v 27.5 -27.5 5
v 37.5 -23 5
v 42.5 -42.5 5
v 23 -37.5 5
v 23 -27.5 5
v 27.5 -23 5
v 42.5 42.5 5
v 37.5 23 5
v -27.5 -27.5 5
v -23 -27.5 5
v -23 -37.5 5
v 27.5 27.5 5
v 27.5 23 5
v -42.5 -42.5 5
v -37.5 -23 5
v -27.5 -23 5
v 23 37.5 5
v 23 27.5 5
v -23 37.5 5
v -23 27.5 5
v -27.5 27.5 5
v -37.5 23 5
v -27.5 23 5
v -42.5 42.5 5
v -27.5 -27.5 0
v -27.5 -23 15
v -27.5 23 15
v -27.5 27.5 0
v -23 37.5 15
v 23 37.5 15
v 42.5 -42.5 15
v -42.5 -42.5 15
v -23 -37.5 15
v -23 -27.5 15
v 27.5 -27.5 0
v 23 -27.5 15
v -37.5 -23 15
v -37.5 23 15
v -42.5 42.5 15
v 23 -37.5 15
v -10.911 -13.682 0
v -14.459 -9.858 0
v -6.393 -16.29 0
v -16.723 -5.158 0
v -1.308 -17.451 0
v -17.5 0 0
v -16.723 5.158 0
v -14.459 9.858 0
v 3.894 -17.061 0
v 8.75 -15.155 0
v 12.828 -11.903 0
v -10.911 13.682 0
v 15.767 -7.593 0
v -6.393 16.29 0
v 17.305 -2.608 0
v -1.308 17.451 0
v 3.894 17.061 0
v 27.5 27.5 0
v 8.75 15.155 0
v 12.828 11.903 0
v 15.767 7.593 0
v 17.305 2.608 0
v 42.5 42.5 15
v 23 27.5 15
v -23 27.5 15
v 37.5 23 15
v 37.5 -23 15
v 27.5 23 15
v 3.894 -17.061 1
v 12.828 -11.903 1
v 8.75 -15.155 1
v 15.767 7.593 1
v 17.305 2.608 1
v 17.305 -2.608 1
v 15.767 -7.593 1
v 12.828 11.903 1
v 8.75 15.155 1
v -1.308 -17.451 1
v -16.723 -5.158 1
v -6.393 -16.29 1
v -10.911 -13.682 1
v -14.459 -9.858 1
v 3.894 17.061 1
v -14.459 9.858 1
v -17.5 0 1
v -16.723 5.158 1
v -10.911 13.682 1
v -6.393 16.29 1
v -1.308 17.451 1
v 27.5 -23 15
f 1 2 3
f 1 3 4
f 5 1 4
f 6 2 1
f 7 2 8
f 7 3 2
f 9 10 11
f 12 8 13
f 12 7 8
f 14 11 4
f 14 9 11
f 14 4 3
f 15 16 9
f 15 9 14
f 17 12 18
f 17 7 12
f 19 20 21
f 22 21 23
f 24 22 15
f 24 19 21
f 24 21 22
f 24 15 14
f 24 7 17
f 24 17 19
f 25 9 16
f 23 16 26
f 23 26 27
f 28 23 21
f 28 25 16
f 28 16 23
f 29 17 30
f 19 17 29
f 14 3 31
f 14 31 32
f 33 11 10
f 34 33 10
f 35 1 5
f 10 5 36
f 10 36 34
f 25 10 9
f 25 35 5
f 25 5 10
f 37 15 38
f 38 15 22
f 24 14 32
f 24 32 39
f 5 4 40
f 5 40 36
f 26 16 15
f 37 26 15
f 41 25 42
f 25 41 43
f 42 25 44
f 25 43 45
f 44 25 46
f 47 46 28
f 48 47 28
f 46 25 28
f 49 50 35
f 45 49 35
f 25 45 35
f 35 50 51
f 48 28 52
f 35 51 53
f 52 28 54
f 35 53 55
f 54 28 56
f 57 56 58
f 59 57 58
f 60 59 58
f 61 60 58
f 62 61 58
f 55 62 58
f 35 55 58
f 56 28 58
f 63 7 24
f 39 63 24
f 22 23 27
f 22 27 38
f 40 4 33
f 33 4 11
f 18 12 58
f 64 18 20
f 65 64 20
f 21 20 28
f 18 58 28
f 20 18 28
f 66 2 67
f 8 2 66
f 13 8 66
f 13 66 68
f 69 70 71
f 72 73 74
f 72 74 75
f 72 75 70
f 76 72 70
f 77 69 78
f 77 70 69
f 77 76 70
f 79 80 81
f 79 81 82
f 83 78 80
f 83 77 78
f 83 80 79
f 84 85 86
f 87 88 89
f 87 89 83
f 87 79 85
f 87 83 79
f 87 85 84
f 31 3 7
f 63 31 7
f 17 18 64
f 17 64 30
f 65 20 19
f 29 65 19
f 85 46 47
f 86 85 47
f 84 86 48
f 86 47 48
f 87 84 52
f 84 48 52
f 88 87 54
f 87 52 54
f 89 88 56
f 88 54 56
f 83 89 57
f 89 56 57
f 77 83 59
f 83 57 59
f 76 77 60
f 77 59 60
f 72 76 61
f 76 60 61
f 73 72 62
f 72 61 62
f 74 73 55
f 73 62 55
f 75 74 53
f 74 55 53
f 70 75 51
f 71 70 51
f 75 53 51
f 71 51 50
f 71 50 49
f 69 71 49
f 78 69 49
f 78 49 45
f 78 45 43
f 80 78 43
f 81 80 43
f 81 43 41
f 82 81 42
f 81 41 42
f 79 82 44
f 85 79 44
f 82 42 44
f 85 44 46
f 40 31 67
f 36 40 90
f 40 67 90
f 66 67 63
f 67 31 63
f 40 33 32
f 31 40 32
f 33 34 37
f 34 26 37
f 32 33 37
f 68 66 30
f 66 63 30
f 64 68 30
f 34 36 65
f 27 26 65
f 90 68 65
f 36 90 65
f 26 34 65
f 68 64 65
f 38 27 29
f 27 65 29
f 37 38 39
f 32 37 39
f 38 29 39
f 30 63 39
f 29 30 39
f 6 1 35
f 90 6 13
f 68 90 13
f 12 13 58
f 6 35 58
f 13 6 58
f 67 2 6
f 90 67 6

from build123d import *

# Parameters (mm, degrees)
SKETCH_1_W          = 75
SKETCH_1_H          = 75
EXTRUDE_1_DEPTH     = 15
SKETCH_6_R          = 17.5
CUT_EXTRUDE_7_DEPTH = 1
SKETCH_7_W          = 75
SKETCH_7_H          = 75
SKETCH_7_W_2        = 55
SKETCH_7_H_2        = 55
CUT_EXTRUDE_8_DEPTH = 5
SKETCH_8_W          = 10
SKETCH_8_H          = 46
SKETCH_8_W_2        = 46
SKETCH_8_H_2        = 10
CUT_EXTRUDE_9_DEPTH = 54.967582862
SKETCH_9_W          = 85
SKETCH_9_H          = 85
SKETCH_9_W_2        = 75
SKETCH_9_H_2        = 75
EXTRUDE_2_DEPTH     = 10


with BuildPart() as part:
    # ｽｹｯﾁ1 → ﾎﾞｽ - 押し出し1 (new body)
    with BuildSketch(Plane.XY):
        Rectangle(SKETCH_1_W, SKETCH_1_H)
    extrude(amount=EXTRUDE_1_DEPTH)

    # ｽｹｯﾁ6 → ｶｯﾄ - 押し出し7 (cut)
    with BuildSketch(Plane(origin=(0, 0, 0), x_dir=(-1, 0, 0), z_dir=(0, 0, -1))):
        Circle(SKETCH_6_R)
    extrude(amount=-CUT_EXTRUDE_7_DEPTH, mode=Mode.SUBTRACT)

    # ｽｹｯﾁ7 → ｶｯﾄ - 押し出し8 (cut)
    with BuildSketch(Plane(origin=(0, 0, 0), x_dir=(-1, 0, 0), z_dir=(0, 0, -1))):
        Rectangle(SKETCH_7_W, SKETCH_7_H)
        Rectangle(SKETCH_7_W_2, SKETCH_7_H_2, mode=Mode.SUBTRACT)
    extrude(amount=-CUT_EXTRUDE_8_DEPTH, mode=Mode.SUBTRACT)

    # ｽｹｯﾁ8 → ｶｯﾄ - 押し出し9 (cut, through all)
    with BuildSketch(Plane(origin=(0, 0, 5), x_dir=(-1, 0, 0), z_dir=(0, 0, -1))):
        with Locations((-32.5, 0)):
            Rectangle(SKETCH_8_W, SKETCH_8_H)
        with Locations((32.5, 0)):
            Rectangle(SKETCH_8_W, SKETCH_8_H)
        with Locations((0, -32.5)):
            Rectangle(SKETCH_8_W_2, SKETCH_8_H_2)
        with Locations((0, 32.5)):
            Rectangle(SKETCH_8_W_2, SKETCH_8_H_2)
    extrude(amount=-CUT_EXTRUDE_9_DEPTH, mode=Mode.SUBTRACT)

    # ｽｹｯﾁ9 → ﾎﾞｽ - 押し出し2 (add)
    with BuildSketch(Plane(origin=(0, 0, 5), x_dir=(-1, 0, 0), z_dir=(0, 0, -1))):
        Rectangle(SKETCH_9_W, SKETCH_9_H)
        Rectangle(SKETCH_9_W_2, SKETCH_9_H_2, mode=Mode.SUBTRACT)
    extrude(amount=-EXTRUDE_2_DEPTH)


solid = part.part
